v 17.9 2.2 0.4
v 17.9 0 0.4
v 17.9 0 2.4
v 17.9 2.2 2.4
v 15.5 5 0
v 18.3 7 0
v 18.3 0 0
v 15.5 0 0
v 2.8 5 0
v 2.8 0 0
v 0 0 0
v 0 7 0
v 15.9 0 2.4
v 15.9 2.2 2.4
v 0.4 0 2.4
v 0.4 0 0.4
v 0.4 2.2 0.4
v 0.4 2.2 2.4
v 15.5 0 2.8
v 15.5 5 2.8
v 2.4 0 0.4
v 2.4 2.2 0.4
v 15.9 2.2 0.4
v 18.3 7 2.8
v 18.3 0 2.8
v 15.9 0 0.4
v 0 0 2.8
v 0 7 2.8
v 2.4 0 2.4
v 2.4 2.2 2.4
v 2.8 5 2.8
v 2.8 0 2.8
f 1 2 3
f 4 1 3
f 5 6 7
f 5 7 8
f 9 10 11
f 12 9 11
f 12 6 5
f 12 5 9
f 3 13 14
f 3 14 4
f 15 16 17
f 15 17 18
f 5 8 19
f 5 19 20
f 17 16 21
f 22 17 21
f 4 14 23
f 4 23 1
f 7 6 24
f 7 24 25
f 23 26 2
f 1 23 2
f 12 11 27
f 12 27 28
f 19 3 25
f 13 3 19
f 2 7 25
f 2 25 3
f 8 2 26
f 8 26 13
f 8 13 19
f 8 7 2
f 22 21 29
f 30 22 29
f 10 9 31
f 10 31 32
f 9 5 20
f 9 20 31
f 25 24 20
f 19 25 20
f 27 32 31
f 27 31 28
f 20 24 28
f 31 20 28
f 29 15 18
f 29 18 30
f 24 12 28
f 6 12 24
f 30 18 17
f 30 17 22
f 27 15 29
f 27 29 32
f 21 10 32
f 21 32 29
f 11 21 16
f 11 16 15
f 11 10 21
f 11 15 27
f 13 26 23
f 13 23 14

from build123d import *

# Parameters (mm, degrees)
BOSS_EXTRUDE1_DEPTH = 2.8
SKETCH2_W           = 2
SKETCH2_H           = 2
CUT_EXTRUDE1_DEPTH  = 2.2


with BuildPart() as part:
    # Sketch1 → Boss-Extrude1 (new body)
    with BuildSketch(Plane.XY):
        Polygon((0, 0), (0, 7), (18.3, 7), (18.3, 0), (15.5, 0), (15.5, 5), (2.8, 5), (2.8, 0), align=None)
    extrude(amount=BOSS_EXTRUDE1_DEPTH)

    # Sketch2 → Cut-Extrude1 (cut)
    with BuildSketch(Plane.XZ):
        with Locations((16.9, 1.4)):
            Rectangle(SKETCH2_W, SKETCH2_H)
        with Locations((1.4, 1.4)):
            Rectangle(SKETCH2_W, SKETCH2_H)
    extrude(amount=-CUT_EXTRUDE1_DEPTH, mode=Mode.SUBTRACT)


solid = part.part
